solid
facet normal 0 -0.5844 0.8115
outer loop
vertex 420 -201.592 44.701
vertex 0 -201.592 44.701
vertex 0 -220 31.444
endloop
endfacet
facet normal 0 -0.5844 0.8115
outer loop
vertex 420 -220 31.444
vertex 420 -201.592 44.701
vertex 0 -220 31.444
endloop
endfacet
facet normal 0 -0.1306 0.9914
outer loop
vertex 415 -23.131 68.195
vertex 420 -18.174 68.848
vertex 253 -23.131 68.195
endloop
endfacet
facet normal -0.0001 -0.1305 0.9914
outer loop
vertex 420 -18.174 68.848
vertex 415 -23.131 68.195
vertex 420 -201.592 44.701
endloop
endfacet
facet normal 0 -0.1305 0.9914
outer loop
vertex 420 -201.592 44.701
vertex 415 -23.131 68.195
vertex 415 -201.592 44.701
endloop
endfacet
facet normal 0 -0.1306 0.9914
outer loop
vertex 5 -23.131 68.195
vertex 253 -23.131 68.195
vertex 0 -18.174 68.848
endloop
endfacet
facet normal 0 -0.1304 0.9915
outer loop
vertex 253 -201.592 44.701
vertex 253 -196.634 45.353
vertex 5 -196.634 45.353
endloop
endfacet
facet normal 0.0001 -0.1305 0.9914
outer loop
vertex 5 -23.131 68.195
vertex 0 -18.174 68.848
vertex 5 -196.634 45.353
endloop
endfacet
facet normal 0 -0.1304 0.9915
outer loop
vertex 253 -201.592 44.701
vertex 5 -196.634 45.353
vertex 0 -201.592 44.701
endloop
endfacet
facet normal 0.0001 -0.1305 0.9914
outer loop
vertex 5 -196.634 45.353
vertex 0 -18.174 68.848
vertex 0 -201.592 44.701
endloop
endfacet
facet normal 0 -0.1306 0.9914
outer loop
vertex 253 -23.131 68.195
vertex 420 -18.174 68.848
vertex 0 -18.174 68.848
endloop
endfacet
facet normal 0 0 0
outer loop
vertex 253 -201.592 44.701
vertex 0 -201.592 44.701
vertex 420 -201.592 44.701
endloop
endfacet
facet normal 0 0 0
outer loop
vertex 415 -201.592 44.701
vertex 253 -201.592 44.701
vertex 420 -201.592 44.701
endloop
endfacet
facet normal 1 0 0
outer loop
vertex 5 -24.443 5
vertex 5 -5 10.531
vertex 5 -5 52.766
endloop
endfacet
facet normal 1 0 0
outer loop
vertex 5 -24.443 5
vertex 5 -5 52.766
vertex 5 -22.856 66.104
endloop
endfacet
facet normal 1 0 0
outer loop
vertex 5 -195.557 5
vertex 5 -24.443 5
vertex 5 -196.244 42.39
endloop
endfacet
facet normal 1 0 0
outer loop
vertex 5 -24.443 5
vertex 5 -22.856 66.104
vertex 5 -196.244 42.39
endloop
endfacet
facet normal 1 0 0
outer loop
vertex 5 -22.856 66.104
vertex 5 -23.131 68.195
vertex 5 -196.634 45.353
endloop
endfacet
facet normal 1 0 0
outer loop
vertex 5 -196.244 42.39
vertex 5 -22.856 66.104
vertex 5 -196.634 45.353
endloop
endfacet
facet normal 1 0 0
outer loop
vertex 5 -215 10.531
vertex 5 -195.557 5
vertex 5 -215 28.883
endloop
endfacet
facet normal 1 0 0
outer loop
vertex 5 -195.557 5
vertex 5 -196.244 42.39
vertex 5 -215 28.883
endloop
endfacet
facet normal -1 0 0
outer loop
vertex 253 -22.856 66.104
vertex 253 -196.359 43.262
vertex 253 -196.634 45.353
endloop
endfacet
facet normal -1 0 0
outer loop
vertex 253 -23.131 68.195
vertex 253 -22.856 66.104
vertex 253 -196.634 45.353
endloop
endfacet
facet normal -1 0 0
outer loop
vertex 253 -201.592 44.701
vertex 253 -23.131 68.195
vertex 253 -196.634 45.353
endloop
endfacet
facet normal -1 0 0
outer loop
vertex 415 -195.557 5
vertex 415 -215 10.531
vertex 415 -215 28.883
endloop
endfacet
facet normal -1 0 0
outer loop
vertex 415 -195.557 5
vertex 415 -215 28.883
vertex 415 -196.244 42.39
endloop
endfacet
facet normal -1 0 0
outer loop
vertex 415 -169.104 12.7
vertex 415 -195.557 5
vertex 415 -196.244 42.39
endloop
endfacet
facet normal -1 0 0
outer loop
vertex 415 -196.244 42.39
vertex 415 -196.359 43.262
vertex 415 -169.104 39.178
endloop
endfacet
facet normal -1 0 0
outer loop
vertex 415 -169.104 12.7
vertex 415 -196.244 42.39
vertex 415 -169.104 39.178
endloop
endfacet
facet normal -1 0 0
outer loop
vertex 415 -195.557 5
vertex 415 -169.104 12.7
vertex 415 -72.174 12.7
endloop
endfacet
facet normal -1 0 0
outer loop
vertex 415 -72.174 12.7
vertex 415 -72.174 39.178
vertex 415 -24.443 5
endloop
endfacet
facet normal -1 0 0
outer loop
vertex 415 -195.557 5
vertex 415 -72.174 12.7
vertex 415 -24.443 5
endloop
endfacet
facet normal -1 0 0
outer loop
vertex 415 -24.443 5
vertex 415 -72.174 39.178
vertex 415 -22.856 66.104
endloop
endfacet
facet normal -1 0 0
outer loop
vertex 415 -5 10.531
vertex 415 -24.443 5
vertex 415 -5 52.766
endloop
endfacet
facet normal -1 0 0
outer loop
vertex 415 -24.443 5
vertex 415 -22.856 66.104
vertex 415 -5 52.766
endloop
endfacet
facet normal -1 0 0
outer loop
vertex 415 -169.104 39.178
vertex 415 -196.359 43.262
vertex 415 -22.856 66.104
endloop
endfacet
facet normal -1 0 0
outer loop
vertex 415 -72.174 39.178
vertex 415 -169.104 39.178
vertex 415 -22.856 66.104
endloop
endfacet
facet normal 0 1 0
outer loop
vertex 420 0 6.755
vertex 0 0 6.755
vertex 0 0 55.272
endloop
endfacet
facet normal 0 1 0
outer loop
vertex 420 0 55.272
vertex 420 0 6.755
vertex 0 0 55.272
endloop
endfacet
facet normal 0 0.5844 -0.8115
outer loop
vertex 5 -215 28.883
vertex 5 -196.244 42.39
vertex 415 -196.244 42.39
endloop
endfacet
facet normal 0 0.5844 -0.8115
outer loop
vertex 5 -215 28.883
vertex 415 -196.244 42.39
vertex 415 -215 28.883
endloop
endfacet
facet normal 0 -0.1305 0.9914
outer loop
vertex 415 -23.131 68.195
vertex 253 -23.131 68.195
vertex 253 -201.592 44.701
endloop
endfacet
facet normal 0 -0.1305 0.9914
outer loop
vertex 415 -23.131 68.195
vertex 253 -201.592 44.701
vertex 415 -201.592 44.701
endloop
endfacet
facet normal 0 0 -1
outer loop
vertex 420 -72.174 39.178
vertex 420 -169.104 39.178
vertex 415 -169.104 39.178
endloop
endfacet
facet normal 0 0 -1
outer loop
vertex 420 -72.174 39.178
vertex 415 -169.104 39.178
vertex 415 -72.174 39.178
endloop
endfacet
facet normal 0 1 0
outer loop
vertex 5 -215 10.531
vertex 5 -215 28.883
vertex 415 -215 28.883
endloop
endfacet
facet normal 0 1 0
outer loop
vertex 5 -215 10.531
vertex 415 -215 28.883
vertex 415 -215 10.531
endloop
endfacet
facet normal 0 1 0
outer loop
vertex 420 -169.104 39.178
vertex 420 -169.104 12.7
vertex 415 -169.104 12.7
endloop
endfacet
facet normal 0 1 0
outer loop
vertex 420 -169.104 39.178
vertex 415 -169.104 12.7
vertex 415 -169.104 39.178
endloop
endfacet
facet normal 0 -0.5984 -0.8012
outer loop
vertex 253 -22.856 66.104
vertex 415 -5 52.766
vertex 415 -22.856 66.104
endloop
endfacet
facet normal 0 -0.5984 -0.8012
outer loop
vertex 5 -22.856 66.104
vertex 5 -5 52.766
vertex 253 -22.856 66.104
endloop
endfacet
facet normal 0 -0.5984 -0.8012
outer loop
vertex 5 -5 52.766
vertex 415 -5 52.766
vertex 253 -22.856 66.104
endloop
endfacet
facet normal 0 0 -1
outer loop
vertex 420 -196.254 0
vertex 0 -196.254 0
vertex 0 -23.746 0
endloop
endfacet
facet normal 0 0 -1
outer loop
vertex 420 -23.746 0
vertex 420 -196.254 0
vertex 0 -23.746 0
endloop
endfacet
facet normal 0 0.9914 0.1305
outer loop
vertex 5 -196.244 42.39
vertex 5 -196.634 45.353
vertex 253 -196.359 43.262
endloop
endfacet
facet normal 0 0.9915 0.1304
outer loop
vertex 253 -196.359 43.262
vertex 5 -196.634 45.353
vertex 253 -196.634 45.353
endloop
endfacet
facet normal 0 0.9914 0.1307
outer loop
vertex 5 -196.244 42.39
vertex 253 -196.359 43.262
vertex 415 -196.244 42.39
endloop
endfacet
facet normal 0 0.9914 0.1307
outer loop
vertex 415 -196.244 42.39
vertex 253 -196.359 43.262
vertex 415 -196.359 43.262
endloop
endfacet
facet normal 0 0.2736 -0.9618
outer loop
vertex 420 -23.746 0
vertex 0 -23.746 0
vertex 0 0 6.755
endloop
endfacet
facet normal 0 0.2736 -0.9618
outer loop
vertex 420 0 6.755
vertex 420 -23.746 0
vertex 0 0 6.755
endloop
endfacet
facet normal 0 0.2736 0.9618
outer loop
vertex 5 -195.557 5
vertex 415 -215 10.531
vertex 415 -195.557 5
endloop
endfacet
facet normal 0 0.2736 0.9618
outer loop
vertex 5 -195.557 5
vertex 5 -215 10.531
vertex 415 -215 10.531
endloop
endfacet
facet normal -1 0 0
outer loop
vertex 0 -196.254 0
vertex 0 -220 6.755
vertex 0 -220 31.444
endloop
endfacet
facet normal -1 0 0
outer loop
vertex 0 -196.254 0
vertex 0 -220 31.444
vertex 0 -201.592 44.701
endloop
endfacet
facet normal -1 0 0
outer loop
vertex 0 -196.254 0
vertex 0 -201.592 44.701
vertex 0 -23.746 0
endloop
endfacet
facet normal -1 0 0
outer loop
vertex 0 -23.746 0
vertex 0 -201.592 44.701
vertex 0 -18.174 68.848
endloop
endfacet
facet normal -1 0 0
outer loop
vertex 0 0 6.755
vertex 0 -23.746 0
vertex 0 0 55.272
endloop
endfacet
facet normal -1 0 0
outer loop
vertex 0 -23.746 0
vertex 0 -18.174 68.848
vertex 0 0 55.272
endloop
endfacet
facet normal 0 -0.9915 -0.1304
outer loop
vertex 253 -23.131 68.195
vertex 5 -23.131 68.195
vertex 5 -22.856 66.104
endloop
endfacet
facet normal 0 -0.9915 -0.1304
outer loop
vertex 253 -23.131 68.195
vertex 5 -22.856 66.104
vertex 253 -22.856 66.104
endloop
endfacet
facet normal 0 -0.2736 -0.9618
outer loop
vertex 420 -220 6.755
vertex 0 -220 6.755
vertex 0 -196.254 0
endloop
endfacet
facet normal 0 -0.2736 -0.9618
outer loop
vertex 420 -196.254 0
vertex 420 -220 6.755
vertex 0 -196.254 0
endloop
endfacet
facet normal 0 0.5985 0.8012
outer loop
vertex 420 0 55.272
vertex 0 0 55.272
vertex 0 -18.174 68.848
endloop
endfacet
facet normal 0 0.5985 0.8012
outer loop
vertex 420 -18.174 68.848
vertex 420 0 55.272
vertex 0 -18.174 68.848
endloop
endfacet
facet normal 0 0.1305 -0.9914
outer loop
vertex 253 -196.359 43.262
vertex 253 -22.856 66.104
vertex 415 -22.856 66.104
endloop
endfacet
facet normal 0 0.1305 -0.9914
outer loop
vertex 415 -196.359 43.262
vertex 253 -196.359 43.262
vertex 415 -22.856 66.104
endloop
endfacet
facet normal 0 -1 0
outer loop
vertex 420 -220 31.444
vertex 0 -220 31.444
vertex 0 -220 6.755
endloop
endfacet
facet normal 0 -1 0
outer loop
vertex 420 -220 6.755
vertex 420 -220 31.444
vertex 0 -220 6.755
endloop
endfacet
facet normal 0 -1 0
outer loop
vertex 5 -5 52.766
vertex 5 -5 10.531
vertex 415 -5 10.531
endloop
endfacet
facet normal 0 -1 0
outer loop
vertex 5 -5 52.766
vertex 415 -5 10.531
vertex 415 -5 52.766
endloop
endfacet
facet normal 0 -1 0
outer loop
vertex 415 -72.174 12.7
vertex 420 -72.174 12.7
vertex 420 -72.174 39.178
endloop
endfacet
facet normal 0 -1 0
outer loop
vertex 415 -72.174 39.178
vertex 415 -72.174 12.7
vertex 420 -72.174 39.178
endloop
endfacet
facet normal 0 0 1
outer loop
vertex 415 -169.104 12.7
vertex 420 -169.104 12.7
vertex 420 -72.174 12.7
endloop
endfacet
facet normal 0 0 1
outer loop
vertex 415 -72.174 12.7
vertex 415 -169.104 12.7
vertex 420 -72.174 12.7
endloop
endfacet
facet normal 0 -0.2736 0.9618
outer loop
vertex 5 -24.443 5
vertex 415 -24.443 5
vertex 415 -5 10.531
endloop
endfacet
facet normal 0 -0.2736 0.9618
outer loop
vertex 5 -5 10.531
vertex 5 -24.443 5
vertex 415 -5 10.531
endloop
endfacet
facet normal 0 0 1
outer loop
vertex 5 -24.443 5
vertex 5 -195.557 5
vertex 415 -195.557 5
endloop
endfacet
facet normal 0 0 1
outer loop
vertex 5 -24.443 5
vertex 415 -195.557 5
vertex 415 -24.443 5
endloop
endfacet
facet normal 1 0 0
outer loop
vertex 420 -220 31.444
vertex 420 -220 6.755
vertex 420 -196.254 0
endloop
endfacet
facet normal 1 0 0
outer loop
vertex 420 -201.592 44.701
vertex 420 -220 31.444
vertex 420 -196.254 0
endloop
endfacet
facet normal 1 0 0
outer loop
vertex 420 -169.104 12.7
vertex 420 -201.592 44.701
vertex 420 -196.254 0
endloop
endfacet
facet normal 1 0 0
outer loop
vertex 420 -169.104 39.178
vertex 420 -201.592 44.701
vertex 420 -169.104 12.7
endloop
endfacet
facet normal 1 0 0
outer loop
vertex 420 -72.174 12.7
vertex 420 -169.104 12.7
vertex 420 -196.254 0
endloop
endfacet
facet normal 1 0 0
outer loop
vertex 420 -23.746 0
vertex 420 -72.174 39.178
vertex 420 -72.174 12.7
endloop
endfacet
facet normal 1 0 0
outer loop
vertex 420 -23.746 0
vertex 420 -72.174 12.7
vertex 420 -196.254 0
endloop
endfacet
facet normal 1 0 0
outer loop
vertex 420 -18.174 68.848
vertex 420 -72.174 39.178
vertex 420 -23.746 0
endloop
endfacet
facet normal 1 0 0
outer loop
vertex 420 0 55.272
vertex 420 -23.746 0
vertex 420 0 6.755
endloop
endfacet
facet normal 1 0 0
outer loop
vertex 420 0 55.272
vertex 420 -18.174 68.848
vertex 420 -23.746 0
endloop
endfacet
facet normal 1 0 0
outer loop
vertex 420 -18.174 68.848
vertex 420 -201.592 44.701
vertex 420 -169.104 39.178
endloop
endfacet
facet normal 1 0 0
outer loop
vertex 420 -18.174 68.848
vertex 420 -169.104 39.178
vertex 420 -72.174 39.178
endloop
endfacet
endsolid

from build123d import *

# Parameters (mm, degrees)
PAD_DEPTH       = 420
THICKNESS_T     = -5
SKETCH001_W     = 175
SKETCH001_H     = 410
POCKET_DEPTH    = 13
SKETCH002_W     = 96.930253
SKETCH002_H     = 26.478514
POCKET001_DEPTH = 8
SKETCH003_W     = 162
SKETCH003_H     = 2.108998
PAD001_DEPTH    = 180


with BuildPart() as part:
    # Sketch → Pad (new body)
    with BuildSketch(Plane.YZ):
        Polygon((-196.253947, 0), (-23.746053, 0), (0, 6.755281), (0, 55.271607), (-18.174265, 68.847916), (-201.591564, 44.70057), (-220, 31.443514), (-220, 6.755281), align=None)
    extrude(amount=PAD_DEPTH)

    # Thickness
    thickness_openings = [part.faces().sort_by_distance(p)[0] for p in [
        (210, -109.882914, 56.774243),
    ]]
    offset(amount=THICKNESS_T, openings=thickness_openings, kind=Kind.INTERSECTION)

    # Sketch001 (on Face5 of Pad) → Pocket (cut)
    with BuildSketch(Plane(origin=(0, -9.219212, 70.026871), x_dir=(0, -0.991445, -0.130526), z_dir=(0, -0.130526, 0.991445))):
        with Locations((101.532325, 210)):
            Rectangle(SKETCH001_W, SKETCH001_H)
    extrude(amount=-POCKET_DEPTH, mode=Mode.SUBTRACT)

    # Sketch002 (on Face5 of Pocket) → Pocket001 (cut)
    with BuildSketch(Plane.YZ.offset(420)):
        with Locations((-120.639269, 25.939101)):
            Rectangle(SKETCH002_W, SKETCH002_H)
    extrude(amount=-POCKET001_DEPTH, mode=Mode.SUBTRACT)

    # Sketch003 (on Face13 of Pocket001) → Pad001 (join)
    with BuildSketch(Plane(origin=(0, -13.912277, -1.831586), x_dir=(1, 0, 0), z_dir=(0, -0.991445, -0.130526))):
        with Locations((334, 69.576631)):
            Rectangle(SKETCH003_W, SKETCH003_H)
    extrude(amount=PAD001_DEPTH)


solid = part.part
